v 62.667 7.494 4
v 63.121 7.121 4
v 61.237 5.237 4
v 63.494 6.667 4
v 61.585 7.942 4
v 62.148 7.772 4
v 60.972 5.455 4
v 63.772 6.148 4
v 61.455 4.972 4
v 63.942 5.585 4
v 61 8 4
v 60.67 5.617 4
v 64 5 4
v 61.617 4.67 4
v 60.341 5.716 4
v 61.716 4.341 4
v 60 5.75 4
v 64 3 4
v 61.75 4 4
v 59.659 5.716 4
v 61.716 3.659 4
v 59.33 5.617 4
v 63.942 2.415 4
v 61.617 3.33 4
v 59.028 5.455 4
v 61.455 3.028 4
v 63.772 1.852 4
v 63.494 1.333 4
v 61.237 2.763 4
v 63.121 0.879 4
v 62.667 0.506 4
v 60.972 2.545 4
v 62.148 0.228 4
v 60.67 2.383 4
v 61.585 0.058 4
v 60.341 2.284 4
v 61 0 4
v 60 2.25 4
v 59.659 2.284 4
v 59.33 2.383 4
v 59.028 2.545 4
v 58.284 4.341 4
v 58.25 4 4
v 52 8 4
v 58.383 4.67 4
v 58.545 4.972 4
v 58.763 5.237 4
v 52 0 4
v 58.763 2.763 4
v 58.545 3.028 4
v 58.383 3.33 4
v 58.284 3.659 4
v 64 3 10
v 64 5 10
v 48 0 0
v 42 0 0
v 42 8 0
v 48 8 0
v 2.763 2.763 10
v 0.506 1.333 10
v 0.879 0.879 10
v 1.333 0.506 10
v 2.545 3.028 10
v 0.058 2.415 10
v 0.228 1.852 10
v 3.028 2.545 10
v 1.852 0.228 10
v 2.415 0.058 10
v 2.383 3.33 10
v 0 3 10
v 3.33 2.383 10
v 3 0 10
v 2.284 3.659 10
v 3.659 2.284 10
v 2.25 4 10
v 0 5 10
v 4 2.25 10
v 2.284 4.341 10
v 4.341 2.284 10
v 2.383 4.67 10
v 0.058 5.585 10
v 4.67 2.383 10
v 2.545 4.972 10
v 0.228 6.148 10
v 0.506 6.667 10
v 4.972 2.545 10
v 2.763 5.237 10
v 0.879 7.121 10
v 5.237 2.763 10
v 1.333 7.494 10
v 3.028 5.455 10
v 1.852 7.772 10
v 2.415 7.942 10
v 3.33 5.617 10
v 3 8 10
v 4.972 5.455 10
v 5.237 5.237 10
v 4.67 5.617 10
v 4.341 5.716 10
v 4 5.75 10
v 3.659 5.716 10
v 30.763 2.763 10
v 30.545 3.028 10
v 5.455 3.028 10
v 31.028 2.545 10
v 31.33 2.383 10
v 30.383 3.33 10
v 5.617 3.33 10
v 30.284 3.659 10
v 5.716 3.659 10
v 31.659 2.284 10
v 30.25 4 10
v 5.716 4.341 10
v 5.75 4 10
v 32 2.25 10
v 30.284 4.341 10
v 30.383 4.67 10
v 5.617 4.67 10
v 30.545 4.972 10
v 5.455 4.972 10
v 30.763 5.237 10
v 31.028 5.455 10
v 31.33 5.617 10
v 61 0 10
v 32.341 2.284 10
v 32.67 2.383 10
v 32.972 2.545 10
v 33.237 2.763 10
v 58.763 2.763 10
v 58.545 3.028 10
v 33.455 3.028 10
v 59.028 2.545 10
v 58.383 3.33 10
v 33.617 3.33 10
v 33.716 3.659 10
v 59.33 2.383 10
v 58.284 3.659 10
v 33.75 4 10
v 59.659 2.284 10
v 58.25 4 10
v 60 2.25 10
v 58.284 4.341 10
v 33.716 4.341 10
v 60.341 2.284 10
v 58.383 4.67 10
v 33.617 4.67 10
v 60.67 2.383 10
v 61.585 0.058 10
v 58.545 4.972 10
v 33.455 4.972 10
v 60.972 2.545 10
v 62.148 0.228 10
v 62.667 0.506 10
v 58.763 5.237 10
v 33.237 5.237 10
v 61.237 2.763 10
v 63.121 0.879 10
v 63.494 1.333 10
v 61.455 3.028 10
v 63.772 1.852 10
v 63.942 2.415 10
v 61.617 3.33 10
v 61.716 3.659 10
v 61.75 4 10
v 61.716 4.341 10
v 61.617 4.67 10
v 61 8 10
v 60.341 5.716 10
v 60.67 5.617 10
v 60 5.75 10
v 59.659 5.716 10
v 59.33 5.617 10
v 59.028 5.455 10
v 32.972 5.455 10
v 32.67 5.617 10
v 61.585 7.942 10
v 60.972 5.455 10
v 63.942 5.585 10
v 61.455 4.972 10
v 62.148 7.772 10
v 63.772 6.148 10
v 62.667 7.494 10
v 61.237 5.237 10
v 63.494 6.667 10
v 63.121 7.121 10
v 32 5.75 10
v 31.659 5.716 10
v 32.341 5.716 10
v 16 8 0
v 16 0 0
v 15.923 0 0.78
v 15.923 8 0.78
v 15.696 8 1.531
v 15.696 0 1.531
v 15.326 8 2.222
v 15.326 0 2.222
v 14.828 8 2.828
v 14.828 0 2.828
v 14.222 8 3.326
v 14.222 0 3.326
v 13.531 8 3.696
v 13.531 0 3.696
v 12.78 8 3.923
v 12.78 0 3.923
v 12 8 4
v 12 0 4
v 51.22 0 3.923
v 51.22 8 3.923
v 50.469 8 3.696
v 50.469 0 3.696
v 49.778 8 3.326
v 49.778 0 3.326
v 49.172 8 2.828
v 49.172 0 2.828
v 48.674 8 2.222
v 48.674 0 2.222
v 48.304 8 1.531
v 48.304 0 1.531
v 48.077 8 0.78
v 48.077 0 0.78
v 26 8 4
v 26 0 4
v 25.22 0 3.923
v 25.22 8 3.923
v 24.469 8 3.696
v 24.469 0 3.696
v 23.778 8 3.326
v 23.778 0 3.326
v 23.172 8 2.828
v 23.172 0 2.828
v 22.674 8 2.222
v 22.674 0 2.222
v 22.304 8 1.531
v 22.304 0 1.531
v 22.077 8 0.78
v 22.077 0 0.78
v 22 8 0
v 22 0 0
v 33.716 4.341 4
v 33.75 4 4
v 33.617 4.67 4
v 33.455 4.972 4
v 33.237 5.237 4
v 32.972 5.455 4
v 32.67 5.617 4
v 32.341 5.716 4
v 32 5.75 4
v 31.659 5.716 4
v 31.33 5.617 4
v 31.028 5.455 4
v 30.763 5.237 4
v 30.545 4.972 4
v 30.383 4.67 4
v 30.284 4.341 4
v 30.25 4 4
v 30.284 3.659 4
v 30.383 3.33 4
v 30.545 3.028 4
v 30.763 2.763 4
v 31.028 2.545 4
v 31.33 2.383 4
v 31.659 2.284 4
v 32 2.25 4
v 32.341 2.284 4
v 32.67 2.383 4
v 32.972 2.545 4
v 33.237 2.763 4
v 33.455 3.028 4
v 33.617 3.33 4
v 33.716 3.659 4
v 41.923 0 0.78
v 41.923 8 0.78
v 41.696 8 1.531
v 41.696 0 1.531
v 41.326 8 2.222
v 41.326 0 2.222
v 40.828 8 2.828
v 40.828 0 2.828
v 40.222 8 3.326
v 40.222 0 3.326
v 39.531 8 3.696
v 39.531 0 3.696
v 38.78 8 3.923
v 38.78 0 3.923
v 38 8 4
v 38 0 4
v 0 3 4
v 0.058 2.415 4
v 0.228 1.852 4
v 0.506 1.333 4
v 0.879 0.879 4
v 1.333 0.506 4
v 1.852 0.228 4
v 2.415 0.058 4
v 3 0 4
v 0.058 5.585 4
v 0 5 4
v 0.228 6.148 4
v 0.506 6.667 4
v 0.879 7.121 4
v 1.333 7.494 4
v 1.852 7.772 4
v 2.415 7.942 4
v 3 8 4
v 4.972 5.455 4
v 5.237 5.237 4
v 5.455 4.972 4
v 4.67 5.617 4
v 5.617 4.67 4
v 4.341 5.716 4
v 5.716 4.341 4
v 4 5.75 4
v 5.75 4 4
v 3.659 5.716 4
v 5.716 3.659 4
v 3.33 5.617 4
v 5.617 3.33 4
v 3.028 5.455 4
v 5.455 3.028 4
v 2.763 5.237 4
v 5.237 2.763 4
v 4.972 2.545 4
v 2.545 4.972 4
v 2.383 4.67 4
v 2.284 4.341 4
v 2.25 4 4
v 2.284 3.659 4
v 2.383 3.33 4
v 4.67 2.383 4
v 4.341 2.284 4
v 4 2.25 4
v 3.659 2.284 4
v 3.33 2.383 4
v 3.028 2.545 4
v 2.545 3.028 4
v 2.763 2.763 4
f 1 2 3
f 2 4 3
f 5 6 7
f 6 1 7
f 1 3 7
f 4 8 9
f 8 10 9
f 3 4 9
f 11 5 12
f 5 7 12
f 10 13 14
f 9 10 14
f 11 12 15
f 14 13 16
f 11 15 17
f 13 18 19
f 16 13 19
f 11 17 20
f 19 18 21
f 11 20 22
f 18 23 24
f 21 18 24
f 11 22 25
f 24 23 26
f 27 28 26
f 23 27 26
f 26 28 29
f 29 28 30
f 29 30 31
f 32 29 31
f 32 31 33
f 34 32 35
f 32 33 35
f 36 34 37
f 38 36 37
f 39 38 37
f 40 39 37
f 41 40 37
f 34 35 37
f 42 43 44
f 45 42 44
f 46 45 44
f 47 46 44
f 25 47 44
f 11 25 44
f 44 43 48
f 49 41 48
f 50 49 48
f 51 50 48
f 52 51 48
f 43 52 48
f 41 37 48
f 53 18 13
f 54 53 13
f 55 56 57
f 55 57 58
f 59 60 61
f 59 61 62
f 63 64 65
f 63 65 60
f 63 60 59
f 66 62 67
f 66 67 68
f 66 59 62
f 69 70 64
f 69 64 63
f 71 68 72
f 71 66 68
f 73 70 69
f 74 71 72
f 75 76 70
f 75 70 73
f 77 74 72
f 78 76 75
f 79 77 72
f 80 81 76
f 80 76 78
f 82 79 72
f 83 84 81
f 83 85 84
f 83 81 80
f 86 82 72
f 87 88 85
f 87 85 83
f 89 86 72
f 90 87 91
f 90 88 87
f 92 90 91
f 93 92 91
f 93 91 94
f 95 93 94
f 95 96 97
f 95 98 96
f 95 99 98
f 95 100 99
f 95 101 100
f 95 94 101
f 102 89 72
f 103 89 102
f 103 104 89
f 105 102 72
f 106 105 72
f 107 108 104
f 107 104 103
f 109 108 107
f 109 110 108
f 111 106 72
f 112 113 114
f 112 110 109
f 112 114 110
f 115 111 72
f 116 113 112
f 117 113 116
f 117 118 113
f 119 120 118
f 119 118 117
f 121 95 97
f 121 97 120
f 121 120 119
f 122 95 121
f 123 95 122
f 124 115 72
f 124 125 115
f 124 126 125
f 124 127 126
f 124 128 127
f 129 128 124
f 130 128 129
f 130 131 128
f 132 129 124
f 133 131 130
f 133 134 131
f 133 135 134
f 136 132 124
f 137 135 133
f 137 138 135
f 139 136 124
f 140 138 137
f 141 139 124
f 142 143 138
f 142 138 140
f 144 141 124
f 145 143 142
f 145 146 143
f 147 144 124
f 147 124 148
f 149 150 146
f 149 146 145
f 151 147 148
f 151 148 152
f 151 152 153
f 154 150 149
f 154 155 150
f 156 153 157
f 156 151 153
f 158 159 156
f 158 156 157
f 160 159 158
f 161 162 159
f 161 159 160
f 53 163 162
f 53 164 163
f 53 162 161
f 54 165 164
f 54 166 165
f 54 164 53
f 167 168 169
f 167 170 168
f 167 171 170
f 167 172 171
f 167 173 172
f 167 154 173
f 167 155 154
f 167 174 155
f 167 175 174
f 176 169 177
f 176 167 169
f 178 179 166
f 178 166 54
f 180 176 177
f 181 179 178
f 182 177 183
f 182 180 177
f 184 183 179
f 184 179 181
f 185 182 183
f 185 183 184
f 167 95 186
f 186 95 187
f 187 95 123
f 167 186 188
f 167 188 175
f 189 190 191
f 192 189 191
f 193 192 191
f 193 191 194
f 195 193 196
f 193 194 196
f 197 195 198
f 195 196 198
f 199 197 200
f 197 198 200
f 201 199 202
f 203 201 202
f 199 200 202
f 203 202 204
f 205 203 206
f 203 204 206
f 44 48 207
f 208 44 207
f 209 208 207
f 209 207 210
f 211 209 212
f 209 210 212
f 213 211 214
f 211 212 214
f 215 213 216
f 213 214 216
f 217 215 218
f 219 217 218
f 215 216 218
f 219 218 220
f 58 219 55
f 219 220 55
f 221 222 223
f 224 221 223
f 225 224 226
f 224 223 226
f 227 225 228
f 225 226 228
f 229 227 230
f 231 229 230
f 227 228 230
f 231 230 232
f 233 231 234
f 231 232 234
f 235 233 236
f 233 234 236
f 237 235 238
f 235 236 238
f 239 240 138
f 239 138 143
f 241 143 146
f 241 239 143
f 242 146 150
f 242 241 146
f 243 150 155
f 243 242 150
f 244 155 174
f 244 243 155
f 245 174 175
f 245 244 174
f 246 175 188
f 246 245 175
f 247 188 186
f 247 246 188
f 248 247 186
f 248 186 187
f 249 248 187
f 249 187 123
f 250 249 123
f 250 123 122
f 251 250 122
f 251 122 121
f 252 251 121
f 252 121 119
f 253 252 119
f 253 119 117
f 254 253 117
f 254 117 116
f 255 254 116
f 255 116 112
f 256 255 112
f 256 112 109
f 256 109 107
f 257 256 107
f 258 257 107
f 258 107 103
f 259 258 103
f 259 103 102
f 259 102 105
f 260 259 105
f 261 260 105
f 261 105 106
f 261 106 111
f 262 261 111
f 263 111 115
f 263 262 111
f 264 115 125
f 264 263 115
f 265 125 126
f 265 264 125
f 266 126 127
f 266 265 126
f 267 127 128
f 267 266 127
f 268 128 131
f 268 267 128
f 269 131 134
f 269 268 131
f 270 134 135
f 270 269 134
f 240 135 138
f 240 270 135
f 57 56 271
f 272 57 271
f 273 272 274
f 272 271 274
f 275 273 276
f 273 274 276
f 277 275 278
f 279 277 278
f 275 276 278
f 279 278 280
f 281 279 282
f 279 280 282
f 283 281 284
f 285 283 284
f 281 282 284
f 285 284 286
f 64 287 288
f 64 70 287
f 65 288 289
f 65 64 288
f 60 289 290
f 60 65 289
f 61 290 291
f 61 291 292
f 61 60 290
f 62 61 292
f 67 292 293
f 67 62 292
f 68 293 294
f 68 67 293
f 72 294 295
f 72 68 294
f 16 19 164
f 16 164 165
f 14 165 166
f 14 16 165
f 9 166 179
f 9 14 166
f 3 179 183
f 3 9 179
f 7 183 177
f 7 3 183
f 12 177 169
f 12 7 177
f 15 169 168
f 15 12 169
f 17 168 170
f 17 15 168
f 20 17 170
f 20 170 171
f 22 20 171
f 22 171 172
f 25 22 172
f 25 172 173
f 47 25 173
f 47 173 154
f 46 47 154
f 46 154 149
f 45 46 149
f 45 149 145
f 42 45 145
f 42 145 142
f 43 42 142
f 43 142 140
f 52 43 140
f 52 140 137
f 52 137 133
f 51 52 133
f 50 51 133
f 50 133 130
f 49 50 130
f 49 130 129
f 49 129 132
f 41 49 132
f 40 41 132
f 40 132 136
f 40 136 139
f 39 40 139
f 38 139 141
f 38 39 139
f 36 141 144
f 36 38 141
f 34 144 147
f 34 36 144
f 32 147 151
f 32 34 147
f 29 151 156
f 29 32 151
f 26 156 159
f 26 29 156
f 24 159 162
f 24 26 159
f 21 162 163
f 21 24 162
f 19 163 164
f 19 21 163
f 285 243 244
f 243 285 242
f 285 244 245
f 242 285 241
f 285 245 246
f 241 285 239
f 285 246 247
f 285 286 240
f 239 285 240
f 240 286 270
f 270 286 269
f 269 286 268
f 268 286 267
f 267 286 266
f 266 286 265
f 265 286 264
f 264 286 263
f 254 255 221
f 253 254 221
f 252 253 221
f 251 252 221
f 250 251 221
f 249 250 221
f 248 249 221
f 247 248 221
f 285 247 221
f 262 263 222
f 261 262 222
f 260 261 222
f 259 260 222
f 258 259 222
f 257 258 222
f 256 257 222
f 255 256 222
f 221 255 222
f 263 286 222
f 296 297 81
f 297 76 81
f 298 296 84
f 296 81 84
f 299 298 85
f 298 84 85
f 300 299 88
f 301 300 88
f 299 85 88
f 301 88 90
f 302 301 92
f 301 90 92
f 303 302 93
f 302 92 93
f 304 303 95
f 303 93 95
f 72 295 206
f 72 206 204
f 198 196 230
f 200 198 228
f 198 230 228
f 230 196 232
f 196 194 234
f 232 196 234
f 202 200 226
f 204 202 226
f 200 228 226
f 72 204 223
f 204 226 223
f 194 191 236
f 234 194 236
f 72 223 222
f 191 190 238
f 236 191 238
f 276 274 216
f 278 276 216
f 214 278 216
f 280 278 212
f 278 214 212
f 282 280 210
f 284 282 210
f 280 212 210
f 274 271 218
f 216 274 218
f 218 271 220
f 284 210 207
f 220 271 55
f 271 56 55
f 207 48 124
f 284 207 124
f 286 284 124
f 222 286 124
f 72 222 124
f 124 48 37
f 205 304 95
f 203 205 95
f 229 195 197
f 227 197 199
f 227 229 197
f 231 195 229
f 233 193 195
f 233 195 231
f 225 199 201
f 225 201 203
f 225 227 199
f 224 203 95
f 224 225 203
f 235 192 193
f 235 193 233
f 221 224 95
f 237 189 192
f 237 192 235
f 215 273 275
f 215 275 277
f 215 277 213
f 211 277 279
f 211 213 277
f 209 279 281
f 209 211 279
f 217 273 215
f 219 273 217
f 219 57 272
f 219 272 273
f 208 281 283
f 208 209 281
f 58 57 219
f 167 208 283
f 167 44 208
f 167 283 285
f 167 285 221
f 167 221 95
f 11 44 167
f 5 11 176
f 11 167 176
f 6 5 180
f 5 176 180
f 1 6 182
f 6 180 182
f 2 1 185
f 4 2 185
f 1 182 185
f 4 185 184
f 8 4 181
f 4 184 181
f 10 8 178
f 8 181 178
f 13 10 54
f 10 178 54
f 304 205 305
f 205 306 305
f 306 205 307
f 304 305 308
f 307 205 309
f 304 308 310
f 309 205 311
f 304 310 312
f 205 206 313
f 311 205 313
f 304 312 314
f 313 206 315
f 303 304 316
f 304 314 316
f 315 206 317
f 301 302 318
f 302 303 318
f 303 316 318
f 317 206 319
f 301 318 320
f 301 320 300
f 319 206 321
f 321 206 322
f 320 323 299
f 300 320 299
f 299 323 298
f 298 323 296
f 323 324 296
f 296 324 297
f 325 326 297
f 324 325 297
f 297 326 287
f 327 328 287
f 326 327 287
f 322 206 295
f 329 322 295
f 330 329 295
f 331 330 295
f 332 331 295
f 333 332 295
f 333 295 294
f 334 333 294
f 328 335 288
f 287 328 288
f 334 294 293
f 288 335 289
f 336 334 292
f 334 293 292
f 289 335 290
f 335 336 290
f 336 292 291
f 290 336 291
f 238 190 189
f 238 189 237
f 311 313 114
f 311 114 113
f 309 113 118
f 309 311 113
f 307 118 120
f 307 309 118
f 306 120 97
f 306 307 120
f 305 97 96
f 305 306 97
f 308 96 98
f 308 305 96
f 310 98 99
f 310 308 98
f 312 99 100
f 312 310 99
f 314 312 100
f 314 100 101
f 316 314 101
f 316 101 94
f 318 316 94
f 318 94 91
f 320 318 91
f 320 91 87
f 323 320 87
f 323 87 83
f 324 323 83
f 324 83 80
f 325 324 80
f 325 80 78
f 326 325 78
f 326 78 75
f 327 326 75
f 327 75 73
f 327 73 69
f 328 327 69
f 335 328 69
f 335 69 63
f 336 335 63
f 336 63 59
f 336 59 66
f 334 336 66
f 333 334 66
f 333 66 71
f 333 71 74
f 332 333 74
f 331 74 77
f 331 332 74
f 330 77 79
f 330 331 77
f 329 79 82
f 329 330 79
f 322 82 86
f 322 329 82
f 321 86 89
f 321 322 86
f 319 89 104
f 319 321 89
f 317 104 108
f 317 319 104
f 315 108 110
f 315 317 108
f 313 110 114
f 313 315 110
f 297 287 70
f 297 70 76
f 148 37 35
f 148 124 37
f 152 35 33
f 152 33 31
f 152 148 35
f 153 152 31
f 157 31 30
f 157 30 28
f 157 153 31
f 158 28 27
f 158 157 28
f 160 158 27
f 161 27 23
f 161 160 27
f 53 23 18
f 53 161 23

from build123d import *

# Parameters (mm, degrees)
F0_W     = 64
F0_H     = 8
F0_R     = 1.75
F1_DEPTH = 10
F3_DEPTH = 10
F4_R     = 3


with BuildPart() as f1:
    # F0 (on Top) → F1 (new body)
    with BuildSketch(Plane.XY):
        with Locations((32, 4)):
            Rectangle(F0_W, F0_H)
        with Locations((4, 4)):
            Circle(F0_R, mode=Mode.SUBTRACT)
        with Locations((32, 4)):
            Circle(F0_R, mode=Mode.SUBTRACT)
        with Locations((60, 4)):
            Circle(F0_R, mode=Mode.SUBTRACT)
    extrude(amount=F1_DEPTH)

    # F2 (on face) → F3 (cut)
    with BuildSketch(Plane.XZ):
        with BuildLine():
            ThreePointArc((52, 4), (49.171573, 2.828427), (48, 0))
            Line((48, 0), (64, 0))
            Line((64, 0), (64, 4))
            Line((64, 4), (52, 4))
        make_face()
        with BuildLine():
            ThreePointArc((26, 4), (23.171573, 2.828427), (22, 0))
            Line((22, 0), (42, 0))
            ThreePointArc((42, 0), (40.828427, 2.828427), (38, 4))
            Line((38, 4), (26, 4))
        make_face()
        with BuildLine():
            ThreePointArc((16, 0), (14.828427, 2.828427), (12, 4))
            Line((12, 4), (0, 4))
            Line((0, 4), (0, 0))
            Line((0, 0), (16, 0))
        make_face()
    extrude(amount=-F3_DEPTH, mode=Mode.SUBTRACT)

    # F4
    f4_edges = [f1.edges().sort_by_distance(p)[0] for p in [
        (0, 0, 7),
        (0, 8, 7),
        (64, 0, 7),
        (64, 8, 7),
    ]]
    fillet(f4_edges, radius=F4_R)


solid = f1.part
